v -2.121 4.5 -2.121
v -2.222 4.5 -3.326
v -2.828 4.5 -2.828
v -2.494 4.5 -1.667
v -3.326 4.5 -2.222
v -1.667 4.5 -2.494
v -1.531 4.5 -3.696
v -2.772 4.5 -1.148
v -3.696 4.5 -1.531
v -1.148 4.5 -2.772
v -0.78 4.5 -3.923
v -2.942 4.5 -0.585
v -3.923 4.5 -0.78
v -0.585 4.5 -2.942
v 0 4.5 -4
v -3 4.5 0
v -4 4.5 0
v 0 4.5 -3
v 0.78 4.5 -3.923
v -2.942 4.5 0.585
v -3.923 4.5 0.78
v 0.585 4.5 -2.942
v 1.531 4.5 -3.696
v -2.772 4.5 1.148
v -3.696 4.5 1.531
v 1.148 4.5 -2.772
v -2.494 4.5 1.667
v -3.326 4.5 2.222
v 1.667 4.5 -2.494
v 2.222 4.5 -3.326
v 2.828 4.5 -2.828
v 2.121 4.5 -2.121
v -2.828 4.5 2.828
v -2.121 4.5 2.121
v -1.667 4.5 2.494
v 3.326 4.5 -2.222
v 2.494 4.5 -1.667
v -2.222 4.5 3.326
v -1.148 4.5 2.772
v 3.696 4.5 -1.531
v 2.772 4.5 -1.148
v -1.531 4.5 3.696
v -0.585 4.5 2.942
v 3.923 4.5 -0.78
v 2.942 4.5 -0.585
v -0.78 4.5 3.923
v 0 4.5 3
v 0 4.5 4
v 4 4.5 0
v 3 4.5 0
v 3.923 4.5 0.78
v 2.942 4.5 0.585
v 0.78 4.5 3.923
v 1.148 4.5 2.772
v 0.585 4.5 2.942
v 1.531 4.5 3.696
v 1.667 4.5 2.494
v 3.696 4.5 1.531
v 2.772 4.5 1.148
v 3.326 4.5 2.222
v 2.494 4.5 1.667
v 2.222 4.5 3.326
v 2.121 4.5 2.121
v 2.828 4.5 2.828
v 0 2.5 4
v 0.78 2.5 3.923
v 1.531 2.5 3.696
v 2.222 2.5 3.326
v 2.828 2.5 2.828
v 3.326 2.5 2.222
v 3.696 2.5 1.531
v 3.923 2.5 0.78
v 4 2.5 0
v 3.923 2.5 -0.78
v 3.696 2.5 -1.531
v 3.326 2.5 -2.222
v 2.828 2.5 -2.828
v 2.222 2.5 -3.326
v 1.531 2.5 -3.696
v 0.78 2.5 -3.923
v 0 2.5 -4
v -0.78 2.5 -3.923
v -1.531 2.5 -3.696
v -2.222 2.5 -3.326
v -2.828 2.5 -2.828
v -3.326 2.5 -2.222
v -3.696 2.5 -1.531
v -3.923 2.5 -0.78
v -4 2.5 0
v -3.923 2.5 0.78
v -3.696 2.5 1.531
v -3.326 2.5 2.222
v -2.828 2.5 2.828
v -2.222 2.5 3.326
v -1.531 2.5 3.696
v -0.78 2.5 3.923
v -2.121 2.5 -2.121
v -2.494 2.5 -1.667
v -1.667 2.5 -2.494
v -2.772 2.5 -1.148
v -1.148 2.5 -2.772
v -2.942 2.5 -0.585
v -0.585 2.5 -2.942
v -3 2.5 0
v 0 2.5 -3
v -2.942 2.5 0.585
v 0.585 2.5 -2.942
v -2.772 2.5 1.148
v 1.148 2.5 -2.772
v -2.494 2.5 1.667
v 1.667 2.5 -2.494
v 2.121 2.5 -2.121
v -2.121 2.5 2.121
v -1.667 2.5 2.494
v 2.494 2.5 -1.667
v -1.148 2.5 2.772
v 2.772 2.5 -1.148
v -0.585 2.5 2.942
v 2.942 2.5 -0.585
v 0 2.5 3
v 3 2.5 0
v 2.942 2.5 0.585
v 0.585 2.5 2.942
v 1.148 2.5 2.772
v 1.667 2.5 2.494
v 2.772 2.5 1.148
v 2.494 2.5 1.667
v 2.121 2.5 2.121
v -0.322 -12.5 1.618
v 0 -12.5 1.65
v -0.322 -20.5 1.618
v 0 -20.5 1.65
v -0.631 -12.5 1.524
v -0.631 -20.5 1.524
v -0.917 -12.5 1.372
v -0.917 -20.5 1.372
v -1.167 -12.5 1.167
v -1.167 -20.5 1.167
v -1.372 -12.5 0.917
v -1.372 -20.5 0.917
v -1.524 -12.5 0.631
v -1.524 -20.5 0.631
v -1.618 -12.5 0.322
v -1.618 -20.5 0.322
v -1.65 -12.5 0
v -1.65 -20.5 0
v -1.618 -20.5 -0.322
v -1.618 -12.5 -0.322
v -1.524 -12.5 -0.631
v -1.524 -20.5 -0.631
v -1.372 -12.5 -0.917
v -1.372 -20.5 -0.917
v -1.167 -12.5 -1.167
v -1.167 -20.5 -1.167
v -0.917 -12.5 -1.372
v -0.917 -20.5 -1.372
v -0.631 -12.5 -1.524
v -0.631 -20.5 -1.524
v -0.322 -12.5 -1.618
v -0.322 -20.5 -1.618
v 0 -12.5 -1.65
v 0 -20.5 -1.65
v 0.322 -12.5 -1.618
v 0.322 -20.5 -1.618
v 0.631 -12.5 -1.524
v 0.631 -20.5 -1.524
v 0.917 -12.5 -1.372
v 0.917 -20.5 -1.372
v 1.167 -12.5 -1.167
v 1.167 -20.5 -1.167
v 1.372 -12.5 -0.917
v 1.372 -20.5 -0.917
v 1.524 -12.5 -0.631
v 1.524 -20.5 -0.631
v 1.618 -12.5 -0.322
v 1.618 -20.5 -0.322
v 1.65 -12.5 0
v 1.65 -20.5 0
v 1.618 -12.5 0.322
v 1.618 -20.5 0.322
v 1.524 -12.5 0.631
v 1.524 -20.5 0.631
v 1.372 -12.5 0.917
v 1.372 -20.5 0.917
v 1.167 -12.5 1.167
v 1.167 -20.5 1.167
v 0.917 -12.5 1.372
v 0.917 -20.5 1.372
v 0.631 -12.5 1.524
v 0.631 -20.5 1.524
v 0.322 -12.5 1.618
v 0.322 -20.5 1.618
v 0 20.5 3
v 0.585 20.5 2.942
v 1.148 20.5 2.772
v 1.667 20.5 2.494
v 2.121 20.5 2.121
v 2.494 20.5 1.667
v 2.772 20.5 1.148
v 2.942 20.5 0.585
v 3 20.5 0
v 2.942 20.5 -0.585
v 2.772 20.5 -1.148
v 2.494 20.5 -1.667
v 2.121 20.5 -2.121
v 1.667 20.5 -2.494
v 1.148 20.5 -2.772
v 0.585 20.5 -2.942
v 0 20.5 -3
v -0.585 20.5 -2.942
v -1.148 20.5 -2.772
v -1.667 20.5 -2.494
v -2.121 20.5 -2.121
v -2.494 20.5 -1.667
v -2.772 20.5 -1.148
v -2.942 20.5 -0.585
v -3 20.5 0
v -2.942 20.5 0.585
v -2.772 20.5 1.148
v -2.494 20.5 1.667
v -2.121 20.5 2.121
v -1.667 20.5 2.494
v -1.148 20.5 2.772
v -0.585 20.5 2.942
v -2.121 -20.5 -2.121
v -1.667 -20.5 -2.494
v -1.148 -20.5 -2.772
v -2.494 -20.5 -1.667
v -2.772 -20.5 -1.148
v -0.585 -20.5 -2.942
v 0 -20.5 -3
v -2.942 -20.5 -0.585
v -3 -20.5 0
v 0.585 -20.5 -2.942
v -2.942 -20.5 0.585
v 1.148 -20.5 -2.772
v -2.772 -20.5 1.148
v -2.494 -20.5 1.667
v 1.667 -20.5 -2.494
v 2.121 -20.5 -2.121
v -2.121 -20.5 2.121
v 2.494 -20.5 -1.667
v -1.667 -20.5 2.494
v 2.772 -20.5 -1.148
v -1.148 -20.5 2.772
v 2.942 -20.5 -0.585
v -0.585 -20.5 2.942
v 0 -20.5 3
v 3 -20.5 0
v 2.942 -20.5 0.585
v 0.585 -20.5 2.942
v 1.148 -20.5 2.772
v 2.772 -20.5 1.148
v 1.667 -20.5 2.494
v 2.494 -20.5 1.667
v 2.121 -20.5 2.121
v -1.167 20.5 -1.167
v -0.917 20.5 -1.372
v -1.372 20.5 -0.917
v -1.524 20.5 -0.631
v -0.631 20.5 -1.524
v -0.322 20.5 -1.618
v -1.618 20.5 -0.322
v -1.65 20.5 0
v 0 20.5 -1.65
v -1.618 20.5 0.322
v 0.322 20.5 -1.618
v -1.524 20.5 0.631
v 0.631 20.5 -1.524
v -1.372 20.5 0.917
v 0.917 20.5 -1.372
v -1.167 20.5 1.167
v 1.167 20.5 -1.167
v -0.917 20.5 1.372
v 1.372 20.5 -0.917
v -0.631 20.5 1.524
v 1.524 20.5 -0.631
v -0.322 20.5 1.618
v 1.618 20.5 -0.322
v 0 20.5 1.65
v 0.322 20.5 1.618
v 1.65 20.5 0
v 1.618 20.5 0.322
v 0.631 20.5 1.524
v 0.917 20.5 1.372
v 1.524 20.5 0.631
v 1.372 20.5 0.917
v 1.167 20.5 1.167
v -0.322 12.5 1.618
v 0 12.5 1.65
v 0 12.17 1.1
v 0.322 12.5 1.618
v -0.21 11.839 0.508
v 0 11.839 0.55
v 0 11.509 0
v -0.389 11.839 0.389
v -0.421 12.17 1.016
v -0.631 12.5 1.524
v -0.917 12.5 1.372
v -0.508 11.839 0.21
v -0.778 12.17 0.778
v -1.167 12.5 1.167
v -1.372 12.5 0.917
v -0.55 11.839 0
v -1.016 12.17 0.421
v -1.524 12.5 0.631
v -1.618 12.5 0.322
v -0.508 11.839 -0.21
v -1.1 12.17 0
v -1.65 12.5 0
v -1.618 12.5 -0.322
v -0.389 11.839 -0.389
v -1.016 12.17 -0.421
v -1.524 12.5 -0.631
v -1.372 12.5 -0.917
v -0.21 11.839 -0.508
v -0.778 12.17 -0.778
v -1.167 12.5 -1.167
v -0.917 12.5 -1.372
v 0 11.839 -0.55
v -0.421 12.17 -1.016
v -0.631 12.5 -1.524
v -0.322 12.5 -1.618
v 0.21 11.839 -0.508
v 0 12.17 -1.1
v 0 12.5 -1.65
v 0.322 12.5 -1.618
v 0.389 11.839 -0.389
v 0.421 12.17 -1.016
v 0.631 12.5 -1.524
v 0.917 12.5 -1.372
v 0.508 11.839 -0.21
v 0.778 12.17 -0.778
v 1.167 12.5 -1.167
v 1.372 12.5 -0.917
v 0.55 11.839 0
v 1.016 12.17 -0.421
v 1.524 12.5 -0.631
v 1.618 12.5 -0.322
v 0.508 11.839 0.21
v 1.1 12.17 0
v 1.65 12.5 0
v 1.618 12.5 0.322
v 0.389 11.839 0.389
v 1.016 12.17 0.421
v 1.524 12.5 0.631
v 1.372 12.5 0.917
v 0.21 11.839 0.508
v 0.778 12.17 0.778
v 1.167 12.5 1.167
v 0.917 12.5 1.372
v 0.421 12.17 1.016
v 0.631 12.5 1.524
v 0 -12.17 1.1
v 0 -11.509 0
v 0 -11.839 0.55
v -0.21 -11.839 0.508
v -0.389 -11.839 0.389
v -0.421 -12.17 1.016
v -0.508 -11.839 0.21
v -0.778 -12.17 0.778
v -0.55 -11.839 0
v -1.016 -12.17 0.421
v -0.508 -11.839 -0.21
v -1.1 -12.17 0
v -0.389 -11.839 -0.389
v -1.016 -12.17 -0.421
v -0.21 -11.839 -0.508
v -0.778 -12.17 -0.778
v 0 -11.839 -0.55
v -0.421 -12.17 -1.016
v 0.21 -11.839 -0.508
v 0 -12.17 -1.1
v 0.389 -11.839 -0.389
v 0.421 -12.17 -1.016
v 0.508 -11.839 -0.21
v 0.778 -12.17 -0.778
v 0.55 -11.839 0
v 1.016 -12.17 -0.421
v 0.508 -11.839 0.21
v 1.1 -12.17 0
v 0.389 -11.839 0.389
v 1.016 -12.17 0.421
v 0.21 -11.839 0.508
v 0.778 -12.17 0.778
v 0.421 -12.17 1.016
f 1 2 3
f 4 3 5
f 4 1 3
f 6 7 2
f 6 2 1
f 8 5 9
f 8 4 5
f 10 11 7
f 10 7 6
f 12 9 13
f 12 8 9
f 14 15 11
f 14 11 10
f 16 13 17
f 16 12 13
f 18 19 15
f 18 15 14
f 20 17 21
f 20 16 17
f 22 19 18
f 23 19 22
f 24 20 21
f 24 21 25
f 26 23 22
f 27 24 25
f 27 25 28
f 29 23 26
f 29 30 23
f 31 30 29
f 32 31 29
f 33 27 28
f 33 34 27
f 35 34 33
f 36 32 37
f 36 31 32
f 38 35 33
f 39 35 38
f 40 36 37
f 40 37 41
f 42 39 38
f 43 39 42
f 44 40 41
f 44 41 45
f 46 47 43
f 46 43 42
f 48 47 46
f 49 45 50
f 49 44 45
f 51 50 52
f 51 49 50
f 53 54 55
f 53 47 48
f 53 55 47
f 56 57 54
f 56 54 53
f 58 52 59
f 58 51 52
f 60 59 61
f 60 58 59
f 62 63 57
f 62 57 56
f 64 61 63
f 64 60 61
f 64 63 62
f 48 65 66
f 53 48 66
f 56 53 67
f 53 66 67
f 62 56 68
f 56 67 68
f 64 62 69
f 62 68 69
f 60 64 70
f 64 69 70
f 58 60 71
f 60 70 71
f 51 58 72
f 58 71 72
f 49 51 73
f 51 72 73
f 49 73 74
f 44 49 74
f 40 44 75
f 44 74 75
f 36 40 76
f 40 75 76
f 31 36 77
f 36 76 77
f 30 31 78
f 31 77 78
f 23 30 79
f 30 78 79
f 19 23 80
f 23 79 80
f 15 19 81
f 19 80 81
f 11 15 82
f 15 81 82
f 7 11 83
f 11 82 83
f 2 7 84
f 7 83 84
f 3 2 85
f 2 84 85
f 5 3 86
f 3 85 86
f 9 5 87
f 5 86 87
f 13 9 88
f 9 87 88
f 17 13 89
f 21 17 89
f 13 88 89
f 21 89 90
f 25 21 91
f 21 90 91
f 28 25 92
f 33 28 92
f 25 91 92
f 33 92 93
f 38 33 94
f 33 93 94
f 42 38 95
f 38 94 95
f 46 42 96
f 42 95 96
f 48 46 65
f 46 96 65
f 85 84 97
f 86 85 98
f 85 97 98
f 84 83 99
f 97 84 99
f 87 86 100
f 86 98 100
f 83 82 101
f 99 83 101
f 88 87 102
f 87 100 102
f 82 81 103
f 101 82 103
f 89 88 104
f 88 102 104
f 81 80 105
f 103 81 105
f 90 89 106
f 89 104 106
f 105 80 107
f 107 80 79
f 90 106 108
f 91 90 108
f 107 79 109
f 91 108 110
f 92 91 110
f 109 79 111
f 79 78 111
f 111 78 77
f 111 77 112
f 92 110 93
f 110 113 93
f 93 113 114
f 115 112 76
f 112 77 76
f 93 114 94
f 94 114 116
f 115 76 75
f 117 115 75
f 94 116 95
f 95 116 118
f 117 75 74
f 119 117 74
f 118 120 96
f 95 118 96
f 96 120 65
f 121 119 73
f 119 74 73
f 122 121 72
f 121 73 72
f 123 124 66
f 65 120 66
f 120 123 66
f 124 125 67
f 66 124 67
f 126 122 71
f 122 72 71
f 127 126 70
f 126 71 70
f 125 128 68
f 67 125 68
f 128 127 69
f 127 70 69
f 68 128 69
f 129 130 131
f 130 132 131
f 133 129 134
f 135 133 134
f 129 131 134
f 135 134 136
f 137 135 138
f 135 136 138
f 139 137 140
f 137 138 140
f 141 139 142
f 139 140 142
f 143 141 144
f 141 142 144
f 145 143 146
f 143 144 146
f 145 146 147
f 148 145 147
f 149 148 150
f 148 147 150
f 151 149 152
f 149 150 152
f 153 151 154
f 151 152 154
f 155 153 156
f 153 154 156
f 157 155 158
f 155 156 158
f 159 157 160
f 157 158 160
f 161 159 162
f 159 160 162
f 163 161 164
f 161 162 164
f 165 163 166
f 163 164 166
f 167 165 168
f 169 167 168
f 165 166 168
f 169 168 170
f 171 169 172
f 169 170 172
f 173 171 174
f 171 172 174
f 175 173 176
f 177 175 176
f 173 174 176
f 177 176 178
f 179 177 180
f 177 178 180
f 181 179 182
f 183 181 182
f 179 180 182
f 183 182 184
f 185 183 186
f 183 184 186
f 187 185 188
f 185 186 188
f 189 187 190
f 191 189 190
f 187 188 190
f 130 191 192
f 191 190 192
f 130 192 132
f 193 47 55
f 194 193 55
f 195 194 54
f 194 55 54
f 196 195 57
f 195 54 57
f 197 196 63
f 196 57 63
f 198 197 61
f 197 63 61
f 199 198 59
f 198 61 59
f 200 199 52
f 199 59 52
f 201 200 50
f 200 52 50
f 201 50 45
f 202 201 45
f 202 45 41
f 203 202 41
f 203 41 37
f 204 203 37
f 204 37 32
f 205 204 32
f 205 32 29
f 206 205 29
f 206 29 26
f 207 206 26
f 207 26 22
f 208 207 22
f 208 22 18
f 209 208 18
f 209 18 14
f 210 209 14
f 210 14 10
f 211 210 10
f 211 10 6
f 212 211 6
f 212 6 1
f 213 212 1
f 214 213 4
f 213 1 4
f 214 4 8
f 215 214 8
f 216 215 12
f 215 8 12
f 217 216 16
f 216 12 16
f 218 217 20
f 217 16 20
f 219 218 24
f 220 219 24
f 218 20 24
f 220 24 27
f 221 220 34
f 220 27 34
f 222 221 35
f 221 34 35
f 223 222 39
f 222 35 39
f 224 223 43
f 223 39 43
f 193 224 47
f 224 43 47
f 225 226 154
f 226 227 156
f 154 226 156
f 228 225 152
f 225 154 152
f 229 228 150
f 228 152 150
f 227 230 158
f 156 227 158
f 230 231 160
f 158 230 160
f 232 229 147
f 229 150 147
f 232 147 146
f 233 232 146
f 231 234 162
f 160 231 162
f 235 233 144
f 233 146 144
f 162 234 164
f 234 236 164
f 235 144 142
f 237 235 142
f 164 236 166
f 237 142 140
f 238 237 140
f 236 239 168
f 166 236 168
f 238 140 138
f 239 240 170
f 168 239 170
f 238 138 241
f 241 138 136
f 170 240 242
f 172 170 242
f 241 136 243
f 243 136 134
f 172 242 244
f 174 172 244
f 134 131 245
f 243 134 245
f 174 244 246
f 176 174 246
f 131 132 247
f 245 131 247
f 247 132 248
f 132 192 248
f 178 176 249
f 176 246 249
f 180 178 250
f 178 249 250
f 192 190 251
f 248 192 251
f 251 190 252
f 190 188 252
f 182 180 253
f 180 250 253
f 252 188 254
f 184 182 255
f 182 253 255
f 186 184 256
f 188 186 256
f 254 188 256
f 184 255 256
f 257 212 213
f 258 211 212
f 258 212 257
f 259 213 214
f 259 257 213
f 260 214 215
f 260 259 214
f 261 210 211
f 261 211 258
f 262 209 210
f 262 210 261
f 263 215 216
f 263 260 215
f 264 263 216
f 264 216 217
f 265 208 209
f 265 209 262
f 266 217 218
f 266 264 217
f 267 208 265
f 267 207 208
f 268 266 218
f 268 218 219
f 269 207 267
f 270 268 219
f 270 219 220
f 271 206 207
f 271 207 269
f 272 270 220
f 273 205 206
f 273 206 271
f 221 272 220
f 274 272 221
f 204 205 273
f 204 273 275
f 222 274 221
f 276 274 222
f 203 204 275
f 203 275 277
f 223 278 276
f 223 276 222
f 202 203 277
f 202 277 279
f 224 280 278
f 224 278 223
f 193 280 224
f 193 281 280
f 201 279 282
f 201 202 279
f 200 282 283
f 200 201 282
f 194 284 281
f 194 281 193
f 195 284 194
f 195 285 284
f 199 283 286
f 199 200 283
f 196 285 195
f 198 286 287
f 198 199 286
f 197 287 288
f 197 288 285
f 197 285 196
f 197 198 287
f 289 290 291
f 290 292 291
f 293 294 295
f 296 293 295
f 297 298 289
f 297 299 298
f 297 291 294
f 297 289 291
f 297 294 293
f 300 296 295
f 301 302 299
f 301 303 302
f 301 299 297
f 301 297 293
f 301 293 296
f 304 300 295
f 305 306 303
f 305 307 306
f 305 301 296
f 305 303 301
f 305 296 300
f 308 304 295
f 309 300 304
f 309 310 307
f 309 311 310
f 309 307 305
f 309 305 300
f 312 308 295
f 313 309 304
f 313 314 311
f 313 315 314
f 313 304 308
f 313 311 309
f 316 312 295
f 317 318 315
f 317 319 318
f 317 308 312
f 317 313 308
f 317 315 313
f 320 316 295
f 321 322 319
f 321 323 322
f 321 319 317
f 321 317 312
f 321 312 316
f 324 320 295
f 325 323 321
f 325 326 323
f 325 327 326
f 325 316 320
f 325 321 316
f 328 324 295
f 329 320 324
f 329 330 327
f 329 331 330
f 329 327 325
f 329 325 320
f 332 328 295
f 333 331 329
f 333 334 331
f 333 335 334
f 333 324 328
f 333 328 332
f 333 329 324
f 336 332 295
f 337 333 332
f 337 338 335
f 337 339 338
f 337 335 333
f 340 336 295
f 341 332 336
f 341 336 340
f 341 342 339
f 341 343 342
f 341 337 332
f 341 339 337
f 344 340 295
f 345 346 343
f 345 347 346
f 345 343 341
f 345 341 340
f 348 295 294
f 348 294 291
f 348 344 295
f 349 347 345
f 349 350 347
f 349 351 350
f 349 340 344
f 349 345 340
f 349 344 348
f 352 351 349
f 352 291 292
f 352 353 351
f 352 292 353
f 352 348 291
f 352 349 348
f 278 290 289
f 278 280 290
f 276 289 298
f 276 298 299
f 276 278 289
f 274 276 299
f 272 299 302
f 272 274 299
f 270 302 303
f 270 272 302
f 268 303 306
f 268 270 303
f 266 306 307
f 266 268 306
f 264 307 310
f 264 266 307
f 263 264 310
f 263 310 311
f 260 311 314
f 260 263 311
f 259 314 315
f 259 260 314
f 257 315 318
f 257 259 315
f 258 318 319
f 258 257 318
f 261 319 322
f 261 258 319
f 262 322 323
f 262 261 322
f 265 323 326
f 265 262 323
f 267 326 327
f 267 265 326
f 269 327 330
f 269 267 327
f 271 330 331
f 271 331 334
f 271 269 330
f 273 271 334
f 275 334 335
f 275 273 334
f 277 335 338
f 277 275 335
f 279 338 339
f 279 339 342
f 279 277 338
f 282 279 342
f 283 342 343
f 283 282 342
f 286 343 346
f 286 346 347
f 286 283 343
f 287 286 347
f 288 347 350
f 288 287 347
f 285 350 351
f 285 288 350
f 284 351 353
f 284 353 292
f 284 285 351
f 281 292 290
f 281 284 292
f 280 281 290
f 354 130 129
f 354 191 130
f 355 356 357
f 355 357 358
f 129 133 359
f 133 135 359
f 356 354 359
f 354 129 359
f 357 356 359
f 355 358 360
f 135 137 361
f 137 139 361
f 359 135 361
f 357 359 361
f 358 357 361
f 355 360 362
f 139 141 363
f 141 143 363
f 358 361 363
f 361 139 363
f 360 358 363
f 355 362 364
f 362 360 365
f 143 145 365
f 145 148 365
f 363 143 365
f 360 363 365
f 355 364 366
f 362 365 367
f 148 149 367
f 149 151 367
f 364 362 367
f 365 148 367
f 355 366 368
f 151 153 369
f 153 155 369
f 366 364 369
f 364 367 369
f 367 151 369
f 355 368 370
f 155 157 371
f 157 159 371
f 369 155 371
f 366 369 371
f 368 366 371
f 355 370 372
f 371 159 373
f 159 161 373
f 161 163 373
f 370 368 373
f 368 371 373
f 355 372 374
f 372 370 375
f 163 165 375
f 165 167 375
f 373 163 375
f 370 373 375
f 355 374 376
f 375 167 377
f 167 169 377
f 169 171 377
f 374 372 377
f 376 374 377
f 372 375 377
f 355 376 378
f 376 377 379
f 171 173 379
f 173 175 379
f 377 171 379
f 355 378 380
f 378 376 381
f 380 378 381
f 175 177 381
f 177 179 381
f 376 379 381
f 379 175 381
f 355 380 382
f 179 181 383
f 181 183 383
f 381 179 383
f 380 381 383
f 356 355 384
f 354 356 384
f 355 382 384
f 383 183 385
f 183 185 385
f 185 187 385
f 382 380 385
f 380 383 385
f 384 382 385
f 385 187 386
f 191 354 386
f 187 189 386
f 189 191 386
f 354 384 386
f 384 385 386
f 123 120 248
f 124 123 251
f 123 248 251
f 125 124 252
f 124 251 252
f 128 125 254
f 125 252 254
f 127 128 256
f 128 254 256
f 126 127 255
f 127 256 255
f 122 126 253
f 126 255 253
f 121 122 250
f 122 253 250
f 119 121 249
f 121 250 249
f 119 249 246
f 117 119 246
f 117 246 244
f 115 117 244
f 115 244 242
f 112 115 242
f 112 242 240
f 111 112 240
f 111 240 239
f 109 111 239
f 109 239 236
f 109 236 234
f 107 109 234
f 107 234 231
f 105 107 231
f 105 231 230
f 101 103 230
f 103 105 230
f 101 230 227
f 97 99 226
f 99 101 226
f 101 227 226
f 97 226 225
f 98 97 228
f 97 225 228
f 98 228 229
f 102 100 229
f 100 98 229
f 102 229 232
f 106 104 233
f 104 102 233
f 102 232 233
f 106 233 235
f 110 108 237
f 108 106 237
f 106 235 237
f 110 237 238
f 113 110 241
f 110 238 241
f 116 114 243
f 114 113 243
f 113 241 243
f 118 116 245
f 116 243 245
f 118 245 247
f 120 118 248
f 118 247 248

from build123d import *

# Parameters (mm, degrees)
BOSS_EXTRUDE1_DEPTH      = 20.5
BOSS_EXTRUDE1_DEPTH_BACK = 20.5
SKETCH1_R                = 3
SKETCH6_R                = 4
BOSS_EXTRUDE2_DEPTH      = 2


with BuildPart() as part:
    # Sketch1 → Boss-Extrude1 (new, two sides: drawn at the far end of the back side and taken through both)
    with BuildSketch(Plane(origin=(0, 0, 0), x_dir=(1, 0, 0), z_dir=(0, 1, 0)).offset(-BOSS_EXTRUDE1_DEPTH_BACK)):
        Circle(SKETCH1_R)
    extrude(amount=BOSS_EXTRUDE1_DEPTH + BOSS_EXTRUDE1_DEPTH_BACK)

    # Sketch5 → M4x0.7 Tapped Hole1 (revolve, cut)
    with BuildSketch(Plane(origin=(0, 20.5, 0), x_dir=(0, 0, 1), z_dir=(1, 0, 0))):
        Polygon((0, 0), (0, 8.991420021), (1.65, 8), (1.65, 0), align=None)
    m4x0_7_tapped_hole1 = revolve(axis=Axis((0, 26.85, 0), (0, -1, 0)), mode=Mode.SUBTRACT)

    # Sketch6 → Boss-Extrude2 (add)
    with BuildSketch(Plane(origin=(0, 2.5, 0), x_dir=(1, 0, 0), z_dir=(0, 1, 0))):
        Circle(SKETCH6_R)
    extrude(amount=BOSS_EXTRUDE2_DEPTH)

    # Mirror1: M4x0.7 Tapped Hole1 across plane
    add(m4x0_7_tapped_hole1.mirror(Plane.ZX), mode=Mode.SUBTRACT)


solid = part.part
